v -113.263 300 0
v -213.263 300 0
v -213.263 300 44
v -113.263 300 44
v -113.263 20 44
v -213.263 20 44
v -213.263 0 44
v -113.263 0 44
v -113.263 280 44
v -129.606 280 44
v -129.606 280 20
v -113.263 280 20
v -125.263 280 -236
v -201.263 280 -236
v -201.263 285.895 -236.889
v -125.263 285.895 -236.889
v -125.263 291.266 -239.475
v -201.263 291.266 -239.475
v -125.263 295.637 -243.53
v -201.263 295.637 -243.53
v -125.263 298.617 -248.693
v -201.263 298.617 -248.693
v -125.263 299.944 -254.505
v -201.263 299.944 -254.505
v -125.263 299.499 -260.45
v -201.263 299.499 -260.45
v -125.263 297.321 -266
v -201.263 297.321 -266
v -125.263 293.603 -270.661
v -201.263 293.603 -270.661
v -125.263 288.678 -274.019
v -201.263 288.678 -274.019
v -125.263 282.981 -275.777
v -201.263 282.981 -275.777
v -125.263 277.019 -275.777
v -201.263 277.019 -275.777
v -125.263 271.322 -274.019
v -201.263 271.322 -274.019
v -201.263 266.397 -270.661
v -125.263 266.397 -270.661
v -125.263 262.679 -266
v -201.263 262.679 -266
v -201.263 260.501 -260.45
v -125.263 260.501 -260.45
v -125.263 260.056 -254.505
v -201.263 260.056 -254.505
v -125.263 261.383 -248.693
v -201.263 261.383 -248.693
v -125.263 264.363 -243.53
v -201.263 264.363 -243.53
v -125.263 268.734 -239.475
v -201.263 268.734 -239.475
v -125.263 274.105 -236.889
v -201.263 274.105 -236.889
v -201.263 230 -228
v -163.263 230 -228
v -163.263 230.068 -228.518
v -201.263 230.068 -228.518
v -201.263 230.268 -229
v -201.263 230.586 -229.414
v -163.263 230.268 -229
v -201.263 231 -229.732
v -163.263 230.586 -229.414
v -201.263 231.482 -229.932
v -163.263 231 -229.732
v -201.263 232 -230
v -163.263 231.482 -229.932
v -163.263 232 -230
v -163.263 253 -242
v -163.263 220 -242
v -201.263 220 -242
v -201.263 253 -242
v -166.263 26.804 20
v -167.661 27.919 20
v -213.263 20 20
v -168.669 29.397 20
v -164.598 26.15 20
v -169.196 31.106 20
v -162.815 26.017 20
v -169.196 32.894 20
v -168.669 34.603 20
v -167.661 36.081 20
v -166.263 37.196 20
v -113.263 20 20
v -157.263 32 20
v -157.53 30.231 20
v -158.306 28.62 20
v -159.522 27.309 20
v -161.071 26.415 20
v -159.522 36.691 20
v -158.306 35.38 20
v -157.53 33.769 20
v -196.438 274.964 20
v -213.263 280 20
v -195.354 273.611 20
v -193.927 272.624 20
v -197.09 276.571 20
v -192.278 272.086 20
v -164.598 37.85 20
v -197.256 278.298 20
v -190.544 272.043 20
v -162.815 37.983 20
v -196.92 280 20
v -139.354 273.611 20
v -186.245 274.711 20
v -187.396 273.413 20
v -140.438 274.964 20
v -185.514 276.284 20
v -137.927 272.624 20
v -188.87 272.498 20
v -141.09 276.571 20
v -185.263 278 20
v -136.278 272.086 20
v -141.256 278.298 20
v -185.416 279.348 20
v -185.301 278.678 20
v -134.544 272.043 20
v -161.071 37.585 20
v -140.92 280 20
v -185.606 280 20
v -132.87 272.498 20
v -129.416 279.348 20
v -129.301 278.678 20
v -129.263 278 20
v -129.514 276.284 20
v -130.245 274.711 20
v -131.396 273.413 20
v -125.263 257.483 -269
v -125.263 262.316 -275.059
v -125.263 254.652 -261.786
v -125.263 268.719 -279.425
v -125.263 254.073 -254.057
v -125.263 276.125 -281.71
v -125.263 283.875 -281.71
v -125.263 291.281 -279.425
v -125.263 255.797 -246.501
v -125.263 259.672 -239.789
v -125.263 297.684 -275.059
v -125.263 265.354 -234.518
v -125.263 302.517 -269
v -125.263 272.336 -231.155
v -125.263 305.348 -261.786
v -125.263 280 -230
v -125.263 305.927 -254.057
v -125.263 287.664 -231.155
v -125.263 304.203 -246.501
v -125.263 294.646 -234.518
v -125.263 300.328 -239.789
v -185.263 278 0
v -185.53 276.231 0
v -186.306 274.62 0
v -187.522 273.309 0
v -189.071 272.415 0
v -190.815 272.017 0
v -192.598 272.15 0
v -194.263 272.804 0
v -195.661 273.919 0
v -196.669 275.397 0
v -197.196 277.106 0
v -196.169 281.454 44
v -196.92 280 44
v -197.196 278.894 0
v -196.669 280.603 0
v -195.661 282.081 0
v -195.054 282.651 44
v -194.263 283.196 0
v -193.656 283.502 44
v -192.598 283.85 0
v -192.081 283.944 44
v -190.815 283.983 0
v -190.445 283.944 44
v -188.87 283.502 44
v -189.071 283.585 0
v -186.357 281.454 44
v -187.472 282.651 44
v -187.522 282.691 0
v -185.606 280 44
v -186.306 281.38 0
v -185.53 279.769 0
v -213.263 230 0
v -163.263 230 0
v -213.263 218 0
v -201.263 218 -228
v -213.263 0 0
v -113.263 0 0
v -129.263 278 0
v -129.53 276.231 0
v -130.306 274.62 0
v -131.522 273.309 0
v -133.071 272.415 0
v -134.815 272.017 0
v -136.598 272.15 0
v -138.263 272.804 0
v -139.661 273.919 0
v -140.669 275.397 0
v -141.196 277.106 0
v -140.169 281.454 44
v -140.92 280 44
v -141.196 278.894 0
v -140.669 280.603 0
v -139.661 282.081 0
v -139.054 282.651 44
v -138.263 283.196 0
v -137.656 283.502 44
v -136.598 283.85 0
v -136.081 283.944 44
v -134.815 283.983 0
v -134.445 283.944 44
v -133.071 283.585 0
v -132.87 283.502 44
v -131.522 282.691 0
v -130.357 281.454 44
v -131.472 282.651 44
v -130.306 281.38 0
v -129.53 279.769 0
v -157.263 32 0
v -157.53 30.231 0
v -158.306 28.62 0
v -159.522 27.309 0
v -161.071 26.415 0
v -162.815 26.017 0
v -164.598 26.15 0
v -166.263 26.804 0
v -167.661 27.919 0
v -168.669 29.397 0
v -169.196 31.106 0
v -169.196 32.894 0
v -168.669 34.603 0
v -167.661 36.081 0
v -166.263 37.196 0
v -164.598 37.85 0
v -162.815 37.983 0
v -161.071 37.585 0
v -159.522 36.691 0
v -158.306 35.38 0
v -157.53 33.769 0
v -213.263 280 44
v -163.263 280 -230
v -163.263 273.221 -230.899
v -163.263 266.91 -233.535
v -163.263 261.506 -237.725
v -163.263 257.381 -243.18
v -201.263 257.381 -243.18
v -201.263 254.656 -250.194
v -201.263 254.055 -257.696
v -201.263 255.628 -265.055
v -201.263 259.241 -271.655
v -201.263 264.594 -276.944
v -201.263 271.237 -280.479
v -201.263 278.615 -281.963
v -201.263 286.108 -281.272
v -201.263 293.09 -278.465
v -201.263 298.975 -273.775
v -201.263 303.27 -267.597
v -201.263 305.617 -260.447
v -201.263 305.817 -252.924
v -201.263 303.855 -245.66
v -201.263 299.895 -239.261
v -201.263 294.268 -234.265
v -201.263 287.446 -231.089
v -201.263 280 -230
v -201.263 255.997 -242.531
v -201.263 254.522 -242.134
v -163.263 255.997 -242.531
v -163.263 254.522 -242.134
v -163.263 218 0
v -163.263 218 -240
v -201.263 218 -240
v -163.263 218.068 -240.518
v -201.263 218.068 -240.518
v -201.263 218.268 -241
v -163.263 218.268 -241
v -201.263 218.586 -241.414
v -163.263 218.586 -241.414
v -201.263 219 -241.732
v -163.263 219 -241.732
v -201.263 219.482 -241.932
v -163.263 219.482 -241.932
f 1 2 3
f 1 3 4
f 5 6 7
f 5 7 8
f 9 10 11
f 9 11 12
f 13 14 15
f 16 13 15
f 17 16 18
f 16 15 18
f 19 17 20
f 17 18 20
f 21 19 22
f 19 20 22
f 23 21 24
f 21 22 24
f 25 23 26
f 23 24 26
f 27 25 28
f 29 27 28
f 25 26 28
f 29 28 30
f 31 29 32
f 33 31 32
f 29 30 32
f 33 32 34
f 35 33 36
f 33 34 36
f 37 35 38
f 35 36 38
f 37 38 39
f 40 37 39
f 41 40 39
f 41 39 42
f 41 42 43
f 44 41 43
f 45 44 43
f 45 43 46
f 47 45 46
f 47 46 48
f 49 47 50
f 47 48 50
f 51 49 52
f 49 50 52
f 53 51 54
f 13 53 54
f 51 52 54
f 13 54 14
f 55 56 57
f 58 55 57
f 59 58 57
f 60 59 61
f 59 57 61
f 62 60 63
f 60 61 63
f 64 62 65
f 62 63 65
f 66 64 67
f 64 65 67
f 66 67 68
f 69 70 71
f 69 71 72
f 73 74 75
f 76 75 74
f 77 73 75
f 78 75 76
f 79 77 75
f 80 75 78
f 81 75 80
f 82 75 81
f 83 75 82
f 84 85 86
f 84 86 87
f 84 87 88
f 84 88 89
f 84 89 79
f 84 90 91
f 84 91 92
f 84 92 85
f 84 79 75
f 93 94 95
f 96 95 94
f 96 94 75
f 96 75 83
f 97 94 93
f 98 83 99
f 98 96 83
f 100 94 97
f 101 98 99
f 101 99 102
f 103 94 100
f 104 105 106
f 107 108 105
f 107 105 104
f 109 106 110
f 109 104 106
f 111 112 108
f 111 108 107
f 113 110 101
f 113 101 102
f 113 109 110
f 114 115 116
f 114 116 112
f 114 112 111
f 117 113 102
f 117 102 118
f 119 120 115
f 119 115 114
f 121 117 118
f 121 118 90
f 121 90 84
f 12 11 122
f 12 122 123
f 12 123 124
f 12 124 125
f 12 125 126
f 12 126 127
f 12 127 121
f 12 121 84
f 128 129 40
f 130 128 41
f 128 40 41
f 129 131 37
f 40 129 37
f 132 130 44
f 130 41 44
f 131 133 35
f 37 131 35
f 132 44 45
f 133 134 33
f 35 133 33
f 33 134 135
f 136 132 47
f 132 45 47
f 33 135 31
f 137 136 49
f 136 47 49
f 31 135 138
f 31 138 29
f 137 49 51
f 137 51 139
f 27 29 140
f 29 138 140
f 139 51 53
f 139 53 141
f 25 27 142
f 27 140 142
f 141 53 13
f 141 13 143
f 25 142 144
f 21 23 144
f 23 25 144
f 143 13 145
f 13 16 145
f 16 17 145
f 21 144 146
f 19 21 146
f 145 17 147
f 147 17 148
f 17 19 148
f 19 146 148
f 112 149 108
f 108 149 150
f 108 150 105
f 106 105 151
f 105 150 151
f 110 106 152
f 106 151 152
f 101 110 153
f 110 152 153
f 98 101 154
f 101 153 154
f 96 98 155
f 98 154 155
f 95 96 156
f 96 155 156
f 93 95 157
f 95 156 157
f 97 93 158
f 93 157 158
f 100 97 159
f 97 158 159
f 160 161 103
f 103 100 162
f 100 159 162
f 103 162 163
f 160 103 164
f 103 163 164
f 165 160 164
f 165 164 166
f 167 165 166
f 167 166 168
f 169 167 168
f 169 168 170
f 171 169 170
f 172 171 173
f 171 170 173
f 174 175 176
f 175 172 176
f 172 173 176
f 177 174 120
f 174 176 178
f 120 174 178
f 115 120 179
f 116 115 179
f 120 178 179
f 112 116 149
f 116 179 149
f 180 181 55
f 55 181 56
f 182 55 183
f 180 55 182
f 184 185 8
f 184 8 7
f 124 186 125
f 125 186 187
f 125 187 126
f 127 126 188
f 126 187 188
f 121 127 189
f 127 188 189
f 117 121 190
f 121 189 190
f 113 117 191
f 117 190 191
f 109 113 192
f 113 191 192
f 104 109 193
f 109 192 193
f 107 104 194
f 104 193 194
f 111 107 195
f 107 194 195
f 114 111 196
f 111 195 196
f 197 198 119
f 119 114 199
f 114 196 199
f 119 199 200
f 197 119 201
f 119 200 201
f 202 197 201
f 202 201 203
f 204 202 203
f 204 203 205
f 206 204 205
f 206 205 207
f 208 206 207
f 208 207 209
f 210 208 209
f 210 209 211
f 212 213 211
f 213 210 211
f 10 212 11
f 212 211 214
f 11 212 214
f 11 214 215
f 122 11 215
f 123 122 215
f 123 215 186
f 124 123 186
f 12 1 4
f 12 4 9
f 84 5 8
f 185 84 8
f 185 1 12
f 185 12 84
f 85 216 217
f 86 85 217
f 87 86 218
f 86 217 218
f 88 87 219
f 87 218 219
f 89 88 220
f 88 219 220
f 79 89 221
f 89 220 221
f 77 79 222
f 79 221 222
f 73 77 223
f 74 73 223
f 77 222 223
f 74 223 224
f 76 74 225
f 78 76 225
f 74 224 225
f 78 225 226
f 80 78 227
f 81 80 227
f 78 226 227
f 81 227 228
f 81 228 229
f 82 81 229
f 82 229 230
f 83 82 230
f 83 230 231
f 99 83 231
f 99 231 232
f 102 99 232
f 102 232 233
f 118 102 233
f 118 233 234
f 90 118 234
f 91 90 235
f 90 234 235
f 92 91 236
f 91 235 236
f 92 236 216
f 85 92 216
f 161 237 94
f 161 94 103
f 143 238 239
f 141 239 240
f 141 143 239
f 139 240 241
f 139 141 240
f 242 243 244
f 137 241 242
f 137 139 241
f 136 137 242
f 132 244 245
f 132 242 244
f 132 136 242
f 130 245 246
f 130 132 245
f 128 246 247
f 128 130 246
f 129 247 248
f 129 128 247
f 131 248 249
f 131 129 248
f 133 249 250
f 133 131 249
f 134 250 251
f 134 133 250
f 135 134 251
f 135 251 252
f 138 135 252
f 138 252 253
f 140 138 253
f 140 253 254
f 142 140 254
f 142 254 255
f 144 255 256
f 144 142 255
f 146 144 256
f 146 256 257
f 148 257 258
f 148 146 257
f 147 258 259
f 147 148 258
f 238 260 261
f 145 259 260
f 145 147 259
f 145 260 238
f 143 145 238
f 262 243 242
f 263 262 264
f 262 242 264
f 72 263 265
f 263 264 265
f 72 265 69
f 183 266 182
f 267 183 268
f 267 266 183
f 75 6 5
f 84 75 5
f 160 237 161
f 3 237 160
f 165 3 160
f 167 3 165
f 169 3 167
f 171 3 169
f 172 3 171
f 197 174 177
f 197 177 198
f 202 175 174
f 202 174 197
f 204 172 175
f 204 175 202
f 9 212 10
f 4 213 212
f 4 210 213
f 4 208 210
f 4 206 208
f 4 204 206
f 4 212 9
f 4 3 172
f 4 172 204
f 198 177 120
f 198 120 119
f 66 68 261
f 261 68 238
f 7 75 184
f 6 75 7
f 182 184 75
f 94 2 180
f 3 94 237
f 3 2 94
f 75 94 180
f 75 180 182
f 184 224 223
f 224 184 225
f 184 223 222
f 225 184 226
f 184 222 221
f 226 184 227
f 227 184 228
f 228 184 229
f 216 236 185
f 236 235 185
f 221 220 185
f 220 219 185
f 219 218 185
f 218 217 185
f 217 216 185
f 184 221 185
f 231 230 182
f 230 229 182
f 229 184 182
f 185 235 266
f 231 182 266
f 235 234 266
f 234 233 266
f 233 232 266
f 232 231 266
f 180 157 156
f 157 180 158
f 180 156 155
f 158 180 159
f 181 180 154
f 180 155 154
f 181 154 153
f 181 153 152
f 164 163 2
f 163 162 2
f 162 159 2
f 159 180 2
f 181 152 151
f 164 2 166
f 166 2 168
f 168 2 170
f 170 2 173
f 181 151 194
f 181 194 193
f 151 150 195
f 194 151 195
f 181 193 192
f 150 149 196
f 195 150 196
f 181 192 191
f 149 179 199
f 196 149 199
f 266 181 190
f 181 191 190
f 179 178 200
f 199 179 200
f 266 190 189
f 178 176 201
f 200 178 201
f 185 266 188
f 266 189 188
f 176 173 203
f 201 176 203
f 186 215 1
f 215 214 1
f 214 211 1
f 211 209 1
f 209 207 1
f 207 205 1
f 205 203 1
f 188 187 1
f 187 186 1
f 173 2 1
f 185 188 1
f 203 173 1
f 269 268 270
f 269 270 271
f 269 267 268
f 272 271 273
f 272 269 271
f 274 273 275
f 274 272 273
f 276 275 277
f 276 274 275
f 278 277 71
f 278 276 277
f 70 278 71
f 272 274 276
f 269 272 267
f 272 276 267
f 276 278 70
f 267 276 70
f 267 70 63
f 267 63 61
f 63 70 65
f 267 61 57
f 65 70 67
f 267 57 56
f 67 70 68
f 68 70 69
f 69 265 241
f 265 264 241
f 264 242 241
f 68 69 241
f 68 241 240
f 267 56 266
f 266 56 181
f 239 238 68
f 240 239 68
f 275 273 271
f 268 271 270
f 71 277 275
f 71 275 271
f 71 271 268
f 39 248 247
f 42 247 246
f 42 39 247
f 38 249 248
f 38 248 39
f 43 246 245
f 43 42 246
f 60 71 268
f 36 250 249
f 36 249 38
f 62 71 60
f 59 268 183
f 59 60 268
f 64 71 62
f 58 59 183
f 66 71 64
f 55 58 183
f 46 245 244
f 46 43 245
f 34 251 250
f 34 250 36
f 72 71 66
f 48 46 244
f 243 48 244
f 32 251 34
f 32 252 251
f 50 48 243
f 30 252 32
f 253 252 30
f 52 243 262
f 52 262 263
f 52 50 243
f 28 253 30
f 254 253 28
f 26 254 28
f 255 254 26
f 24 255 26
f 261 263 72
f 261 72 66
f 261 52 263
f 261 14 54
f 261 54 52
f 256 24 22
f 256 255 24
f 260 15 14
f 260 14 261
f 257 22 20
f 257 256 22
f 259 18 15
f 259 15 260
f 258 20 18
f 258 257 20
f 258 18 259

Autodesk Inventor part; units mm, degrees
ref_plane "YZ Plane" through (0, 0, 0) normal (1, 0, 0) x (0, 1, 0)
ref_plane "XZ Plane" through (0, 0, 0) normal (0, 1, 0) x (-1, 0, 0)
ref_plane "XY Plane" through (0, 0, 0) normal (0, 0, 1) x (1, 0, 0)
sketch "Sketch1" plane through (0, 0, 0) normal (0, 0, 1) x (1, 0, 0)
  line L0 (-113.263, 0) -> (-213.263, 0)
  line L1 (-213.263, 0) -> (-213.263, 300)
  line L2 (-213.263, 300) -> (-113.263, 300)
  line L3 (-113.263, 300) -> (-113.263, 0)
  circle A0 centre (-163.263, 32) radius 6
  circle A1 centre (-191.263, 278) radius 6
  circle A2 centre (-135.263, 278) radius 6
  point P0 (0, 0)
  dimension "d0" = 100
  dimension "d1" = 300
  dimension "d2" = 12
  dimension "d3" = 32
  dimension "d4" = 12
  dimension "d5" = 22
  dimension "d6" = 22
  dimension "d7" = 12
  dimension "d8" = 22
  dimension "d9" = 22
extrude "Extrusion1" add sketch "Sketch1" along normal blind 44
sketch "Sketch2" plane through (0, 0, 44) normal (0, 0, 1) x (1, 0, 0)
  line L0 (-113.263, 300) -> (-213.263, 300) projected
  line L1 (-213.263, 300) -> (-213.263, 280)
  line L2 (-213.263, 300) -> (-213.263, 0) projected
  line L3 (-213.263, 280) -> (-113.263, 280)
  line L4 (-113.263, 0) -> (-113.263, 300) projected
  line L5 (-113.263, 280) -> (-113.263, 300)
  line L6 (-213.263, 300) -> (-113.263, 300)
  line L7 (-213.263, 0) -> (-213.263, 20)
  line L8 (-213.263, 0) -> (-113.263, 0) projected
  line L9 (-213.263, 0) -> (-113.263, 0)
  line L10 (-113.263, 0) -> (-113.263, 20)
  line L11 (-213.263, 20) -> (-113.263, 20)
  line L12 (-113.263, 20) -> (-113.263, 280)
  line L13 (-213.263, 20) -> (-213.263, 280)
  point P0 (0, 0)
  dimension "d12" = 20
  dimension "d13" = 20
extrude "Extrusion2" cut sketch "Sketch2" against normal blind 24 contours L4 L11 L2 L3
ref_plane "Work Plane1" through (-163.263, 0, 0) normal (-1, 0, 0) x (0, 0, 1)
sketch "Sketch6" plane through (-163.263, 0, 0) normal (-1, 0, 0) x (0, 0, 1)
  line L0 (44, 284) -> (44, 280) projected
  circle A0 centre (-256, 280) radius 26
  point P0 (0, 0)
  dimension "d24" = 52
extrude "Extrusion5" add sketch "Sketch6" along normal mid plane 76
sketch "Sketch7" plane through (-201.263, 280, -256) normal (-1, 0, 0) x (0, 0, 1)
  circle A0 centre (0, 0) radius 20
  point P0 (256, -280)
  dimension "d27" = 40
extrude "Extrusion6" cut sketch "Sketch7" against normal blind 76
sketch "Sketch9" plane through (-163.263, 0, 0) normal (-1, 0, 0) x (0, 0, 1)
  line L0 (44, 284) -> (44, 280) projected
  circle A0 centre (-256, 280) radius 26
  line L1 (0, 300) -> (0, 0) projected
  circle A1 centre (-256, 280) radius 26 projected
  line L2 (0, 230) -> (-228, 230)
  line L3 (-230, 232) -> (-230, 280)
  line L4 (0, 230) -> (0, 218)
  line L5 (0, 218) -> (-240, 218)
  line L6 (-242, 220) -> (-242, 253)
  arc A2 (-230, 232) -> (-228, 230) centre (-228, 232) ccw
  arc A3 (-242, 220) -> (-240, 218) centre (-240, 220) ccw
  line L7 (-242, 253) -> (-250.7822, 253) construction
  line L8 (-243.1836, 257.3871) -> (-250.7822, 253) construction
  arc A4 (-242, 253) -> (-243.1836, 257.3871) centre (-250.7225, 253) ccw
  point P0 (-242, 218)
  point P1 (-243.1797, 257.3805)
  dimension "d35" = 52
  dimension "d37" = 12
  dimension "d38" = 242
  dimension "d39" = 35
  dimension "d40" = 2
  dimension "d41" = 2
  dimension "d42" = 30
extrude "Extrusion7" add sketch "Sketch9" along normal blind 50 contours L3 A2 L2 L1 L5 A3 L6 A4 A0
sketch "Sketch10" plane through (-163.263, 230, 0) normal (0, 1, 0) x (1, 0, 0)
  line L0 (-50, 0) -> (-41.2717, 264.4302)
  line L1 (-41.2717, 264.4302) -> (-54.1734, 264.856)
  line L2 (-54.1734, 264.856) -> (-50, 0)
  point P0 (163.263, 0)
extrude "Extrusion8" cut sketch "Sketch10" against normal blind 50
sketch "Sketch12" plane through (-213.263, 232, -230) normal (-1, 0, 0) x (0, 0, 1)
  line L0 (-12, 21) -> (-12, -2) projected
  line L1 (0, 48) -> (2.6747, 48)
  line L2 (-12, 48) -> (0, 48)
  line L3 (2.6747, 48) -> (2.6747, -2)
  line L4 (2, -2) -> (230, -2) projected
  line L5 (-12, -2) -> (2.6747, -2)
  line L6 (-12, -2) -> (-15.3342, -2)
  line L7 (-15.3342, -2) -> (-15.3342, 48)
  line L8 (-15.3342, 48) -> (-11.4757, 48)
  point P0 (230, -232)
extrude "Extrusion9" cut sketch "Sketch12" against normal blind 12
sketch "Sketch13" plane through (-163.263, 230, 0) normal (0, 1, 0) x (1, 0, 0)
  line L0 (-38, 228) -> (-38, 242) projected
  line L1 (-38, 228) -> (-50, 0)
  line L2 (-42.012, 242) -> (-38, 242) projected
  line L3 (-50, 0) -> (-42.012, 242)
  line L4 (-42.012, 242) -> (-38, 242)
  line L5 (-38, 242) -> (-38, 228)
  point P0 (163.263, 0)
extrude "Extrusion10" cut sketch "Sketch13" against normal blind 12
properties part number "6 - Part 6"
